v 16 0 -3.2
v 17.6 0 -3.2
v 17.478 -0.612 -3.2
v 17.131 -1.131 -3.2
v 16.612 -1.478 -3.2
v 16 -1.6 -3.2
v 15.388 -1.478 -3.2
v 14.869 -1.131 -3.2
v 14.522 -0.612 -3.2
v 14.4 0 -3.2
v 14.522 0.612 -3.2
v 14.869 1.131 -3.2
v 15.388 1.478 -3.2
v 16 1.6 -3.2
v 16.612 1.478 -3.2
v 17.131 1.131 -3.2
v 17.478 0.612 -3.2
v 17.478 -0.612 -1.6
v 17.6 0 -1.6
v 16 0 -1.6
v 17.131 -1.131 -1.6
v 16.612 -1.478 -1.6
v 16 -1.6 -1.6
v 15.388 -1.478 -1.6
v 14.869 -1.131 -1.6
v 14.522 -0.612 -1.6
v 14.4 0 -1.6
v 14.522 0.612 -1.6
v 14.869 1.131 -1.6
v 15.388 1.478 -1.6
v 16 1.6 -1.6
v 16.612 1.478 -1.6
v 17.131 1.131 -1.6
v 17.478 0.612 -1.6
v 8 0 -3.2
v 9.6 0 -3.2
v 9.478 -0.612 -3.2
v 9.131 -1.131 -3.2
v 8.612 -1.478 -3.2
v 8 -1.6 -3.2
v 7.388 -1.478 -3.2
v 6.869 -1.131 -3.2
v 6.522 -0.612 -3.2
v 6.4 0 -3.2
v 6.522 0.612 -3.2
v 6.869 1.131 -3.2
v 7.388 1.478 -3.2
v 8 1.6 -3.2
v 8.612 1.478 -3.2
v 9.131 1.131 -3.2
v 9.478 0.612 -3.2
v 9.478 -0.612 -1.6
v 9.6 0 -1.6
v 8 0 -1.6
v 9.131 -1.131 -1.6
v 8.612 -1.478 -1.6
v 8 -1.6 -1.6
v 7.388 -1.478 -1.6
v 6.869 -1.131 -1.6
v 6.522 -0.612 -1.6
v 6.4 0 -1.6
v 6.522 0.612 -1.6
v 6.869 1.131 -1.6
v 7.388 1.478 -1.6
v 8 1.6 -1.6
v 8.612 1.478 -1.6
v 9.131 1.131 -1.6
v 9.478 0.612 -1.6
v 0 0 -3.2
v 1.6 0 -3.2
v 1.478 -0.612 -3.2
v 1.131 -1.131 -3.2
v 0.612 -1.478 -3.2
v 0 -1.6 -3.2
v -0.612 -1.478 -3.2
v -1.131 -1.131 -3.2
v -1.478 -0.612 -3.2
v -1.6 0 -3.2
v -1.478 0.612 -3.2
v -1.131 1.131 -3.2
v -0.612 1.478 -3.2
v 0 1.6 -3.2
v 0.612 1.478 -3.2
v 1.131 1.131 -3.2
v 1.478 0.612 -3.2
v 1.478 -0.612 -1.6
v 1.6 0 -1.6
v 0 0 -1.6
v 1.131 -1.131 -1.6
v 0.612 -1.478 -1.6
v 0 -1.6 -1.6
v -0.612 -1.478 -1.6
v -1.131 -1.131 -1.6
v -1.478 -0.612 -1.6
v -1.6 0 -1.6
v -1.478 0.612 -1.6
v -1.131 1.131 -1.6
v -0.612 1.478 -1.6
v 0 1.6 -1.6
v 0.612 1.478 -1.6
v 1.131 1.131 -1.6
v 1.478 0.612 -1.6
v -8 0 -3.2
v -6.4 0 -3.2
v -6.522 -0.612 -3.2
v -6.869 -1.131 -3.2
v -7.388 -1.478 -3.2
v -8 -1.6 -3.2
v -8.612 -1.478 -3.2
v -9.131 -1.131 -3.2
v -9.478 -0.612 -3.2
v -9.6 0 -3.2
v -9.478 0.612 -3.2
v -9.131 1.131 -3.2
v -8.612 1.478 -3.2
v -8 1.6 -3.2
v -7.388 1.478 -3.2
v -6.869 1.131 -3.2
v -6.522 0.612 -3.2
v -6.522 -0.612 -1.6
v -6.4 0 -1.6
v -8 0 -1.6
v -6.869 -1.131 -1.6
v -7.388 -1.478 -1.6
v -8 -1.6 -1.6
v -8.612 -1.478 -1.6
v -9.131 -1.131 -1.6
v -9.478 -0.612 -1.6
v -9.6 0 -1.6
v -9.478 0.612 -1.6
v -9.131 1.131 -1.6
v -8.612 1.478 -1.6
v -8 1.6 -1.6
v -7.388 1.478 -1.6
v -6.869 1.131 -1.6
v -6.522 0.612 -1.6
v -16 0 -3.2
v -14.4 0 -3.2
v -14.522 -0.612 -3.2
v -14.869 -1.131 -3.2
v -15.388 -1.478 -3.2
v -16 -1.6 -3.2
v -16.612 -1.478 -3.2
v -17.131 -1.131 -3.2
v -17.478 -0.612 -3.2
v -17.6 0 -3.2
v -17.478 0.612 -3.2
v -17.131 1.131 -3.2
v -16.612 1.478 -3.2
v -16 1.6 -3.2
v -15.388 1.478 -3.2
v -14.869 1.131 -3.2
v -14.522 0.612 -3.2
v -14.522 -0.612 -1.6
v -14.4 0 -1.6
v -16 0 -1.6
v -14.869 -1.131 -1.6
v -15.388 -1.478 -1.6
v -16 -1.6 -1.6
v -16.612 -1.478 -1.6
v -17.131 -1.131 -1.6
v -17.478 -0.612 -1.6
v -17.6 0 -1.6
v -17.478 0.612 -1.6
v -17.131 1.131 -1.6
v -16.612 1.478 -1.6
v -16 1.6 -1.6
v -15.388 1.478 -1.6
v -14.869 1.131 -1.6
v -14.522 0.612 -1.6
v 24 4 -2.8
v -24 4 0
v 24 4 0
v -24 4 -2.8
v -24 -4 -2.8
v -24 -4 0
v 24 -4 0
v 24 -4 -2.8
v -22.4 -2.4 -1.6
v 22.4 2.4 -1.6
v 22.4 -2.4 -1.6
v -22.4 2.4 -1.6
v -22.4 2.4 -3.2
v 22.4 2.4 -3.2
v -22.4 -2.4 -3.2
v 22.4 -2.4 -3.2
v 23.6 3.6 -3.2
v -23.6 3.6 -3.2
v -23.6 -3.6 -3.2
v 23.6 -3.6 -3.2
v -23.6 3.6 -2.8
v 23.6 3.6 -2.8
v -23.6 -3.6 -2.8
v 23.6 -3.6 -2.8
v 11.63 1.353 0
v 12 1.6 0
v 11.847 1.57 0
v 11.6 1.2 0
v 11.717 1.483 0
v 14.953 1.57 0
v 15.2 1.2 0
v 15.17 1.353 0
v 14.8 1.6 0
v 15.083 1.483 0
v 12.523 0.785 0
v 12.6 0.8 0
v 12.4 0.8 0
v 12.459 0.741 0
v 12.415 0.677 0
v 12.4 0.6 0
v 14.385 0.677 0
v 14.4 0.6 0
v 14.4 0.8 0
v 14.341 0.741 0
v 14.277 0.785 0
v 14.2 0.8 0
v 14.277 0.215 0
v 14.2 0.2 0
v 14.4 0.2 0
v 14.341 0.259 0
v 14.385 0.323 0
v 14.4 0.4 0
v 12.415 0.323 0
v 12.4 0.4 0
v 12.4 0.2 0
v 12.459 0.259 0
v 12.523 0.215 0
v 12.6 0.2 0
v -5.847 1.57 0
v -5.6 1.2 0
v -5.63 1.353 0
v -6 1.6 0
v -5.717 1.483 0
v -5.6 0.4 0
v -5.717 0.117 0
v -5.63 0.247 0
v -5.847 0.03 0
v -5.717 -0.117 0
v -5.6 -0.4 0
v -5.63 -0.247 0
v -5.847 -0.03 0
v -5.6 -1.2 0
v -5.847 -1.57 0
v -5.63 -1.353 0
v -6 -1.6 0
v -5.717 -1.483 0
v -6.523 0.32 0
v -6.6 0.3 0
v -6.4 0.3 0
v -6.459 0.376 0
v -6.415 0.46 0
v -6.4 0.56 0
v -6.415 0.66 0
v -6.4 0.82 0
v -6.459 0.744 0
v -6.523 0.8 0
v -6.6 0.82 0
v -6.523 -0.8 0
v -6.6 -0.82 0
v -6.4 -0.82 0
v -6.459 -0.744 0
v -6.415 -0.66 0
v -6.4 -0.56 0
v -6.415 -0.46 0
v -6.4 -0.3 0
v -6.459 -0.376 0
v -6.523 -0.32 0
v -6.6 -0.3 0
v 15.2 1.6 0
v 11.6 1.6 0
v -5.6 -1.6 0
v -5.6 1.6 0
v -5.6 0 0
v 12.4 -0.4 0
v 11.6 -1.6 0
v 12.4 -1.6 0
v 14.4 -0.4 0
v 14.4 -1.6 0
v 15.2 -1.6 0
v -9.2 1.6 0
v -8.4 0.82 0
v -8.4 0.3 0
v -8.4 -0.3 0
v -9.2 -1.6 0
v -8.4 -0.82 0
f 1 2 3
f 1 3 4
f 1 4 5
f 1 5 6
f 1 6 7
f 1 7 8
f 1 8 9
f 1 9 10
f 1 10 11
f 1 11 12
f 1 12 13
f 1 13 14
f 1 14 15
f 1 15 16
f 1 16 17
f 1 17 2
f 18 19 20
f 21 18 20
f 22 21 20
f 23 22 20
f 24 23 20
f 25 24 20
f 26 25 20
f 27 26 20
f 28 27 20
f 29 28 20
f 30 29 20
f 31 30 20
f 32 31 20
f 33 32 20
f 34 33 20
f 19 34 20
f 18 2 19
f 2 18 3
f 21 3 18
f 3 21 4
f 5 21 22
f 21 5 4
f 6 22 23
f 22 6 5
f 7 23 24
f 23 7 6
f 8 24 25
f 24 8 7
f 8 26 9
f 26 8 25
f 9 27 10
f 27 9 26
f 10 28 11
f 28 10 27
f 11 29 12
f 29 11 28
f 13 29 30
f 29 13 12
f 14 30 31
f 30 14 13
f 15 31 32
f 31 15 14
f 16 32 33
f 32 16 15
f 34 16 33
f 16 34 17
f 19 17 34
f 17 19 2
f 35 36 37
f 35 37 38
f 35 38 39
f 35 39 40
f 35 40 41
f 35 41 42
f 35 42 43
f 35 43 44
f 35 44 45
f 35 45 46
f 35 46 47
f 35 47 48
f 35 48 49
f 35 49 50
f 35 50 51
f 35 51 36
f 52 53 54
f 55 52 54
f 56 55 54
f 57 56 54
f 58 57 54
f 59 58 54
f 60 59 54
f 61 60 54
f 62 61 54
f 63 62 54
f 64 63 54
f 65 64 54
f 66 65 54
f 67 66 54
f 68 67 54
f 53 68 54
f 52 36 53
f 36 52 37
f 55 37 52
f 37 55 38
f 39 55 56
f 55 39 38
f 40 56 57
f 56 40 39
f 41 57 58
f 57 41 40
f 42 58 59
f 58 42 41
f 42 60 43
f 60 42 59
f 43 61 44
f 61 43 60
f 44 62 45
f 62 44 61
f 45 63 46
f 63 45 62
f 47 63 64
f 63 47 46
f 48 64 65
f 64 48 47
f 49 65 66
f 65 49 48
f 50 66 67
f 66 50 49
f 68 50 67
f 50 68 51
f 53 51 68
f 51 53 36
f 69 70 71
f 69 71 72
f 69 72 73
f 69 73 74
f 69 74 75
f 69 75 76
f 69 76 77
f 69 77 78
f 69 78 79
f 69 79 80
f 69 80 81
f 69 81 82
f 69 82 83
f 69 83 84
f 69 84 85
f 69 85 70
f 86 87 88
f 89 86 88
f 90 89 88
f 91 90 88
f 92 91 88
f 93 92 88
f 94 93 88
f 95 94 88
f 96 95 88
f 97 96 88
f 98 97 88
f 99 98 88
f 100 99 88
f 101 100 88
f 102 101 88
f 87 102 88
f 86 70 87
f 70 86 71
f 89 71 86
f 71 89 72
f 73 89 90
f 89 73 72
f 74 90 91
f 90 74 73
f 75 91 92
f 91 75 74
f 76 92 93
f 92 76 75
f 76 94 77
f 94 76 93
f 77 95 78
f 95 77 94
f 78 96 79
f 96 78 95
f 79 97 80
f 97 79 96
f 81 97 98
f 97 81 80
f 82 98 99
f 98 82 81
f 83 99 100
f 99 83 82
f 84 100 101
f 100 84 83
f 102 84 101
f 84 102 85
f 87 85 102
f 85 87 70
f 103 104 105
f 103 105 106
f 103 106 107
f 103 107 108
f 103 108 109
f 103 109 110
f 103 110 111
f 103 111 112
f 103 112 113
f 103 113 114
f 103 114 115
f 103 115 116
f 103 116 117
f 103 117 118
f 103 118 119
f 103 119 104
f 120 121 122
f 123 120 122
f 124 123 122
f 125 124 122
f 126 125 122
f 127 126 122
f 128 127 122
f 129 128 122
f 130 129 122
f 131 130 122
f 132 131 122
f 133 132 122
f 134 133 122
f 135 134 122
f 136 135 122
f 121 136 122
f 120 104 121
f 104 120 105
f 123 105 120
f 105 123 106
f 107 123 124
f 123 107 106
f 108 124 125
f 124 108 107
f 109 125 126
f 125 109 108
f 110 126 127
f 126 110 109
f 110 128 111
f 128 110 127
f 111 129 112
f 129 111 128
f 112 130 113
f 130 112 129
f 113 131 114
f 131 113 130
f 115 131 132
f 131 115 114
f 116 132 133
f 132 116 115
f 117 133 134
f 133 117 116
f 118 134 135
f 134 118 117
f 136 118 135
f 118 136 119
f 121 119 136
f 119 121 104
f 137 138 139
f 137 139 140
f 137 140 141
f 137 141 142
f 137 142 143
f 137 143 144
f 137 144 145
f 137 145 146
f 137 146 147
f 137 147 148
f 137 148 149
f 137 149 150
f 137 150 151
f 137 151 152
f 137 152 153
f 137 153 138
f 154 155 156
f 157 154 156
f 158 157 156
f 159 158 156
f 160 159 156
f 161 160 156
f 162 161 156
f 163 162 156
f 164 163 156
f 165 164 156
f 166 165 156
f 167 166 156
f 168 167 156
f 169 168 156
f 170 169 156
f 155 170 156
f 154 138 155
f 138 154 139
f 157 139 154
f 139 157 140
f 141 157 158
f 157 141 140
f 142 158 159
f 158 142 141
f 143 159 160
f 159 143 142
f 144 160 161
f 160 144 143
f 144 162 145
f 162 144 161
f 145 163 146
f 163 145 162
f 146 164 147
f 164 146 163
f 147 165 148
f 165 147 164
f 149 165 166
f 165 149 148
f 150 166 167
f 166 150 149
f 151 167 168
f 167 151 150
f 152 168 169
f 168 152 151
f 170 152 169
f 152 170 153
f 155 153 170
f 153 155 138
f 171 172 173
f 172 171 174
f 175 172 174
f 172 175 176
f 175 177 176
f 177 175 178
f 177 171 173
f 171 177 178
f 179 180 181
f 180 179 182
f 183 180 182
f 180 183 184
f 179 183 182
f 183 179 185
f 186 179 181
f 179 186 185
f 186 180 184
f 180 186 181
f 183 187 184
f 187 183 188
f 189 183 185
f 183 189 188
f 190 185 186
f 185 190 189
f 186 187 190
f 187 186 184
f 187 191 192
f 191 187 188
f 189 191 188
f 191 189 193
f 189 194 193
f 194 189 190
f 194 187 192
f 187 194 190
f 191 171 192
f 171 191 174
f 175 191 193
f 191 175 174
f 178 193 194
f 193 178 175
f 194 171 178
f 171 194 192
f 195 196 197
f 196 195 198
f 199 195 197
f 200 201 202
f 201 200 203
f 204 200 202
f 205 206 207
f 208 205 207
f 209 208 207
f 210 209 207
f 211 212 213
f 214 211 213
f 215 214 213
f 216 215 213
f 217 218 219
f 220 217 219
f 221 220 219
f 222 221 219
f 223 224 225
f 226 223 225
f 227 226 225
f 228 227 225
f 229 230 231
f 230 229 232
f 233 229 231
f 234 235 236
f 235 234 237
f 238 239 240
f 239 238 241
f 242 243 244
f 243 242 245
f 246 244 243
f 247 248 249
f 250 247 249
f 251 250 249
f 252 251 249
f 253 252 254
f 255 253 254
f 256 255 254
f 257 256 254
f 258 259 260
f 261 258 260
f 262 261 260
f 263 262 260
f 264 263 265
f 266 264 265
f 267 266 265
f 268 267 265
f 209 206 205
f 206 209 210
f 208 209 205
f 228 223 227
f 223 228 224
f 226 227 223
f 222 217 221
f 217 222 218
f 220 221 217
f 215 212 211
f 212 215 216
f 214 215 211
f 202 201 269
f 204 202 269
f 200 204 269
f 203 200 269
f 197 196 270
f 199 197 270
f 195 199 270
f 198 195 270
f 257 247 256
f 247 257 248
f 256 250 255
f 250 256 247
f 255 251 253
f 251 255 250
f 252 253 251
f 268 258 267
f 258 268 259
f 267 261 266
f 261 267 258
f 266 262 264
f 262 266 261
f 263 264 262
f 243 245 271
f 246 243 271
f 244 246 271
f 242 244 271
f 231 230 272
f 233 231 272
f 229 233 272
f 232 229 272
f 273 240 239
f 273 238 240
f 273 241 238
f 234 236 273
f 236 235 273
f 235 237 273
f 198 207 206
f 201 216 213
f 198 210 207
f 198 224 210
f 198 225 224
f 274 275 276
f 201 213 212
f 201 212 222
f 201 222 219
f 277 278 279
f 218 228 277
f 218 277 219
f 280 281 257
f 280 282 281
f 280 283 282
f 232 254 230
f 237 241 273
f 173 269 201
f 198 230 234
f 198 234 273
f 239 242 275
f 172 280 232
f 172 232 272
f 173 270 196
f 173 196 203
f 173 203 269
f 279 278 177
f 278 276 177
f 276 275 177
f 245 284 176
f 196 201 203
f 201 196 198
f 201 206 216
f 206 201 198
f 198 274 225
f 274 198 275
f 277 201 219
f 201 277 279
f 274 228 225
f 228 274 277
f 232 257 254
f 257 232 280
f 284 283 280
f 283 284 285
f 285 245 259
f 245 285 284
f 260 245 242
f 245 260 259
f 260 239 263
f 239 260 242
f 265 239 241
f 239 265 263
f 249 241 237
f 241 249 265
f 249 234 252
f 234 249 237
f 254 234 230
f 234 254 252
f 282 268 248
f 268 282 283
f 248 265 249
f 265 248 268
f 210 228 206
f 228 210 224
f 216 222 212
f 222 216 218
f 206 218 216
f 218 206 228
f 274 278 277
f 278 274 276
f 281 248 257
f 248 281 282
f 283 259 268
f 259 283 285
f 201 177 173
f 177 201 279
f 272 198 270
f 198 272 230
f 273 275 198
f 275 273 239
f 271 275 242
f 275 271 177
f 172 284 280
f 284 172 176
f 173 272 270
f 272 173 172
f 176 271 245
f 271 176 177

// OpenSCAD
// file: ../p/4-4edge.scad
use <../lib.scad>
function ldraw_lib__4_4edge() = [
// 0 Circle 1.0
// 0 Name: 4-4edge.dat
// 0 Author: James Jessiman
// 0 !LDRAW_ORG Primitive UPDATE 2017-01
// 0 !LICENSE Licensed under CC BY 2.0 and CC BY 4.0 : see CAreadme.txt
// 
// 0 BFC CERTIFY CCW
  [0,"BFC","CERTIFY"],
  [0,"BFC","CCW"],
// 
// 0 !HISTORY 1998-12-15 [PTadmin] Official Update 1998-10
// 0 !HISTORY 2005-12-28 [PTadmin] Official Update 2005-01
// 0 !HISTORY 2007-06-24 [PTadmin] Header formatted for Contributor Agreement
// 0 !HISTORY 2008-07-01 [PTadmin] Official Update 2008-01
// 0 !HISTORY 2017-01-15 [Steffen] BFCed
// 0 !HISTORY 2017-12-30 [PTadmin] Official Update 2017-01
// 
// 
// 2 24 1 0 0 0.9239 0 0.3827
  [2,24,1,0,0,0.9239,0,0.3827],
// 2 24 0.9239 0 0.3827 0.7071 0 0.7071
  [2,24,0.9239,0,0.3827,0.7071,0,0.7071],
// 2 24 0.7071 0 0.7071 0.3827 0 0.9239
  [2,24,0.7071,0,0.7071,0.3827,0,0.9239],
// 2 24 0.3827 0 0.9239 0 0 1
  [2,24,0.3827,0,0.9239,0,0,1],
// 2 24 0 0 1 -0.3827 0 0.9239
  [2,24,0,0,1,-0.3827,0,0.9239],
// 2 24 -0.3827 0 0.9239 -0.7071 0 0.7071
  [2,24,-0.3827,0,0.9239,-0.7071,0,0.7071],
// 2 24 -0.7071 0 0.7071 -0.9239 0 0.3827
  [2,24,-0.7071,0,0.7071,-0.9239,0,0.3827],
// 2 24 -0.9239 0 0.3827 -1 0 -0
  [2,24,-0.9239,0,0.3827,-1,0,-0],
// 2 24 -1 0 -0 -0.9239 0 -0.3827
  [2,24,-1,0,-0,-0.9239,0,-0.3827],
// 2 24 -0.9239 0 -0.3827 -0.7071 0 -0.7071
  [2,24,-0.9239,0,-0.3827,-0.7071,0,-0.7071],
// 2 24 -0.7071 0 -0.7071 -0.3827 0 -0.9239
  [2,24,-0.7071,0,-0.7071,-0.3827,0,-0.9239],
// 2 24 -0.3827 0 -0.9239 0 0 -1
  [2,24,-0.3827,0,-0.9239,0,0,-1],
// 2 24 0 0 -1 0.3827 0 -0.9239
  [2,24,0,0,-1,0.3827,0,-0.9239],
// 2 24 0.3827 0 -0.9239 0.7071 0 -0.7071
  [2,24,0.3827,0,-0.9239,0.7071,0,-0.7071],
// 2 24 0.7071 0 -0.7071 0.9239 0 -0.3827
  [2,24,0.7071,0,-0.7071,0.9239,0,-0.3827],
// 2 24 0.9239 0 -0.3827 1 0 0
  [2,24,0.9239,0,-0.3827,1,0,0],
];
module ldraw_lib__4_4edge(step=0, col=false, unit=2/5, alt=false, line=0.2, solid=!$preview)
    makepoly(ldraw_lib__4_4edge(), step=step, col=col, unit=unit, alt=alt, line=line, solid=solid);
ldraw_lib__4_4edge(line=0.2);
// file: ../p/4-4disc.scad
use <../lib.scad>
function ldraw_lib__4_4disc() = [
// 0 Disc 1.0
// 0 Name: 4-4disc.dat
// 0 Author: James Jessiman
// 0 !LDRAW_ORG Primitive UPDATE 2002-02
// 0 !LICENSE Licensed under CC BY 2.0 and CC BY 4.0 : see CAreadme.txt
// 
// 0 BFC CERTIFY CCW
  [0,"BFC","CERTIFY"],
  [0,"BFC","CCW"],
// 
// 0 !HISTORY 1998-12-15 [PTadmin] Official Update 1998-10
// 0 !HISTORY 2002-03-23 [sbliss] Added BFC statement
// 0 !HISTORY 2002-04-25 [PTadmin] Official Update 2002-02
// 0 !HISTORY 2007-06-24 [PTadmin] Header formatted for Contributor Agreement
// 0 !HISTORY 2008-07-01 [PTadmin] Official Update 2008-01
// 
// 
// 3 16 0 0 0 1 0 0 0.9239 0 0.3827
  [3,16,0,0,0,1,0,0,0.9239,0,0.3827],
// 3 16 0 0 0 0.9239 0 0.3827 0.7071 0 0.7071
  [3,16,0,0,0,0.9239,0,0.3827,0.7071,0,0.7071],
// 3 16 0 0 0 0.7071 0 0.7071 0.3827 0 0.9239
  [3,16,0,0,0,0.7071,0,0.7071,0.3827,0,0.9239],
// 3 16 0 0 0 0.3827 0 0.9239 0 0 1
  [3,16,0,0,0,0.3827,0,0.9239,0,0,1],
// 3 16 0 0 0 0 0 1 -0.3827 0 0.9239
  [3,16,0,0,0,0,0,1,-0.3827,0,0.9239],
// 3 16 0 0 0 -0.3827 0 0.9239 -0.7071 0 0.7071
  [3,16,0,0,0,-0.3827,0,0.9239,-0.7071,0,0.7071],
// 3 16 0 0 0 -0.7071 0 0.7071 -0.9239 0 0.3827
  [3,16,0,0,0,-0.7071,0,0.7071,-0.9239,0,0.3827],
// 3 16 0 0 0 -0.9239 0 0.3827 -1 0 -0
  [3,16,0,0,0,-0.9239,0,0.3827,-1,0,-0],
// 3 16 0 0 0 -1 0 -0 -0.9239 0 -0.3827
  [3,16,0,0,0,-1,0,-0,-0.9239,0,-0.3827],
// 3 16 0 0 0 -0.9239 0 -0.3827 -0.7071 0 -0.7071
  [3,16,0,0,0,-0.9239,0,-0.3827,-0.7071,0,-0.7071],
// 3 16 0 0 0 -0.7071 0 -0.7071 -0.3827 0 -0.9239
  [3,16,0,0,0,-0.7071,0,-0.7071,-0.3827,0,-0.9239],
// 3 16 0 0 0 -0.3827 0 -0.9239 0 0 -1
  [3,16,0,0,0,-0.3827,0,-0.9239,0,0,-1],
// 3 16 0 0 0 0 0 -1 0.3827 0 -0.9239
  [3,16,0,0,0,0,0,-1,0.3827,0,-0.9239],
// 3 16 0 0 0 0.3827 0 -0.9239 0.7071 0 -0.7071
  [3,16,0,0,0,0.3827,0,-0.9239,0.7071,0,-0.7071],
// 3 16 0 0 0 0.7071 0 -0.7071 0.9239 0 -0.3827
  [3,16,0,0,0,0.7071,0,-0.7071,0.9239,0,-0.3827],
// 3 16 0 0 0 0.9239 0 -0.3827 1 0 0
  [3,16,0,0,0,0.9239,0,-0.3827,1,0,0],
// 0
];
module ldraw_lib__4_4disc(step=0, col=false, unit=2/5, alt=false, line=0.2, solid=!$preview)
    makepoly(ldraw_lib__4_4disc(), step=step, col=col, unit=unit, alt=alt, line=line, solid=solid);
ldraw_lib__4_4disc(line=0.2);
// file: ../p/4-4cyli.scad
use <../lib.scad>
$fa=1; $fs=0.2;
function ldraw_lib__4_4cyli(realsolid=false) = [
// 0 Cylinder 1.0
// 0 Name: 4-4cyli.dat
// 0 Author: James Jessiman
// 0 !LDRAW_ORG Primitive UPDATE 2005-01
// 0 !LICENSE Licensed under CC BY 2.0 and CC BY 4.0 : see CAreadme.txt
// 
// 0 BFC CERTIFY CCW
  [0,"BFC","CERTIFY"],
  [0,"BFC","CCW"],
// 
// 0 !HISTORY 1998-12-15 [PTadmin] Official Update 1998-10
// 0 !HISTORY 2002-03-23 [sbliss] Added BFC statement; merged headers from files in distributions LDraw 0.27 and Complete.
// 0 !HISTORY 2002-04-25 [PTadmin] Official Update 2002-02
// 0 !HISTORY 2004-12-14 [guyvivan] BFC CCW
// 0 !HISTORY 2005-12-28 [PTadmin] Official Update 2005-01
// 0 !HISTORY 2007-06-24 [PTadmin] Header formatted for Contributor Agreement
// 0 !HISTORY 2008-07-01 [PTadmin] Official Update 2008-01
// 
// 
// 4 16 1 1 0 0.9239 1 0.3827 0.9239 0 0.3827 1 0 0
  [4,16,1,1,0,0.9239,1,0.3827,0.9239,0,0.3827,1,0,0],
// 5 24 1 0 0 1 1 0 0.9239 0 0.3827 0.9239 0 -0.3827
  [5,24,1,0,0,1,1,0,0.9239,0,0.3827,0.9239,0,-0.3827],
// 4 16 0.9239 1 0.3827 0.7071 1 0.7071 0.7071 0 0.7071 0.9239 0 0.3827
  [4,16,0.9239,1,0.3827,0.7071,1,0.7071,0.7071,0,0.7071,0.9239,0,0.3827],
// 5 24 0.9239 0 0.3827 0.9239 1 0.3827 0.7071 0 0.7071 1 0 0
  [5,24,0.9239,0,0.3827,0.9239,1,0.3827,0.7071,0,0.7071,1,0,0],
// 4 16 0.7071 1 0.7071 0.3827 1 0.9239 0.3827 0 0.9239 0.7071 0 0.7071
  [4,16,0.7071,1,0.7071,0.3827,1,0.9239,0.3827,0,0.9239,0.7071,0,0.7071],
// 5 24 0.7071 0 0.7071 0.7071 1 0.7071 0.3827 0 0.9239 0.9239 0 0.3827
  [5,24,0.7071,0,0.7071,0.7071,1,0.7071,0.3827,0,0.9239,0.9239,0,0.3827],
// 4 16 0.3827 1 0.9239 0 1 1 0 0 1 0.3827 0 0.9239
  [4,16,0.3827,1,0.9239,0,1,1,0,0,1,0.3827,0,0.9239],
// 5 24 0.3827 0 0.9239 0.3827 1 0.9239 0 0 1 0.7071 0 0.7071
  [5,24,0.3827,0,0.9239,0.3827,1,0.9239,0,0,1,0.7071,0,0.7071],
// 4 16 0 1 1 -0.3827 1 0.9239 -0.3827 0 0.9239 0 0 1
  [4,16,0,1,1,-0.3827,1,0.9239,-0.3827,0,0.9239,0,0,1],
// 5 24 0 0 1 0 1 1 -0.3827 0 0.9239 0.3827 0 0.9239
  [5,24,0,0,1,0,1,1,-0.3827,0,0.9239,0.3827,0,0.9239],
// 4 16 -0.3827 1 0.9239 -0.7071 1 0.7071 -0.7071 0 0.7071 -0.3827 0 0.9239
  [4,16,-0.3827,1,0.9239,-0.7071,1,0.7071,-0.7071,0,0.7071,-0.3827,0,0.9239],
// 5 24 -0.3827 0 0.9239 -0.3827 1 0.9239 -0.7071 0 0.7071 0 0 1
  [5,24,-0.3827,0,0.9239,-0.3827,1,0.9239,-0.7071,0,0.7071,0,0,1],
// 4 16 -0.7071 1 0.7071 -0.9239 1 0.3827 -0.9239 0 0.3827 -0.7071 0 0.7071
  [4,16,-0.7071,1,0.7071,-0.9239,1,0.3827,-0.9239,0,0.3827,-0.7071,0,0.7071],
// 5 24 -0.7071 0 0.7071 -0.7071 1 0.7071 -0.9239 0 0.3827 -0.3827 0 0.9239
  [5,24,-0.7071,0,0.7071,-0.7071,1,0.7071,-0.9239,0,0.3827,-0.3827,0,0.9239],
// 4 16 -0.9239 1 0.3827 -1 1 0 -1 0 0 -0.9239 0 0.3827
  [4,16,-0.9239,1,0.3827,-1,1,0,-1,0,0,-0.9239,0,0.3827],
// 5 24 -0.9239 0 0.3827 -0.9239 1 0.3827 -1 0 0 -0.7071 0 0.7071
  [5,24,-0.9239,0,0.3827,-0.9239,1,0.3827,-1,0,0,-0.7071,0,0.7071],
// 4 16 -1 1 0 -0.9239 1 -0.3827 -0.9239 0 -0.3827 -1 0 0
  [4,16,-1,1,0,-0.9239,1,-0.3827,-0.9239,0,-0.3827,-1,0,0],
// 5 24 -1 0 0 -1 1 0 -0.9239 0 -0.3827 -0.9239 0 0.3827
  [5,24,-1,0,0,-1,1,0,-0.9239,0,-0.3827,-0.9239,0,0.3827],
// 4 16 -0.9239 1 -0.3827 -0.7071 1 -0.7071 -0.7071 0 -0.7071 -0.9239 0 -0.3827
  [4,16,-0.9239,1,-0.3827,-0.7071,1,-0.7071,-0.7071,0,-0.7071,-0.9239,0,-0.3827],
// 5 24 -0.9239 0 -0.3827 -0.9239 1 -0.3827 -0.7071 0 -0.7071 -1 0 0
  [5,24,-0.9239,0,-0.3827,-0.9239,1,-0.3827,-0.7071,0,-0.7071,-1,0,0],
// 4 16 -0.7071 1 -0.7071 -0.3827 1 -0.9239 -0.3827 0 -0.9239 -0.7071 0 -0.7071
  [4,16,-0.7071,1,-0.7071,-0.3827,1,-0.9239,-0.3827,0,-0.9239,-0.7071,0,-0.7071],
// 5 24 -0.7071 0 -0.7071 -0.7071 1 -0.7071 -0.3827 0 -0.9239 -0.9239 0 -0.3827
  [5,24,-0.7071,0,-0.7071,-0.7071,1,-0.7071,-0.3827,0,-0.9239,-0.9239,0,-0.3827],
// 4 16 -0.3827 1 -0.9239 0 1 -1 0 0 -1 -0.3827 0 -0.9239
  [4,16,-0.3827,1,-0.9239,0,1,-1,0,0,-1,-0.3827,0,-0.9239],
// 5 24 -0.3827 0 -0.9239 -0.3827 1 -0.9239 0 0 -1 -0.7071 0 -0.7071
  [5,24,-0.3827,0,-0.9239,-0.3827,1,-0.9239,0,0,-1,-0.7071,0,-0.7071],
// 4 16 0 1 -1 0.3827 1 -0.9239 0.3827 0 -0.9239 0 0 -1
  [4,16,0,1,-1,0.3827,1,-0.9239,0.3827,0,-0.9239,0,0,-1],
// 5 24 0 0 -1 0 1 -1 0.3827 0 -0.9239 -0.3827 0 -0.9239
  [5,24,0,0,-1,0,1,-1,0.3827,0,-0.9239,-0.3827,0,-0.9239],
// 4 16 0.3827 1 -0.9239 0.7071 1 -0.7071 0.7071 0 -0.7071 0.3827 0 -0.9239
  [4,16,0.3827,1,-0.9239,0.7071,1,-0.7071,0.7071,0,-0.7071,0.3827,0,-0.9239],
// 5 24 0.3827 0 -0.9239 0.3827 1 -0.9239 0.7071 0 -0.7071 0 0 -1
  [5,24,0.3827,0,-0.9239,0.3827,1,-0.9239,0.7071,0,-0.7071,0,0,-1],
// 4 16 0.7071 1 -0.7071 0.9239 1 -0.3827 0.9239 0 -0.3827 0.7071 0 -0.7071
  [4,16,0.7071,1,-0.7071,0.9239,1,-0.3827,0.9239,0,-0.3827,0.7071,0,-0.7071],
// 5 24 0.7071 0 -0.7071 0.7071 1 -0.7071 0.9239 0 -0.3827 0.3827 0 -0.9239
  [5,24,0.7071,0,-0.7071,0.7071,1,-0.7071,0.9239,0,-0.3827,0.3827,0,-0.9239],
// 4 16 0.9239 1 -0.3827 1 1 0 1 0 0 0.9239 0 -0.3827
  [4,16,0.9239,1,-0.3827,1,1,0,1,0,0,0.9239,0,-0.3827],
// 5 24 0.9239 0 -0.3827 0.9239 1 -0.3827 1 0 0 0.7071 0 -0.7071
  [5,24,0.9239,0,-0.3827,0.9239,1,-0.3827,1,0,0,0.7071,0,-0.7071],
// 0
];
module ldraw_lib__4_4cyli(step=0, col=false, unit=2/5, alt=false, line=0.2, solid=!$preview)
    makepoly(ldraw_lib__4_4cyli(solid), step=step, col=col, unit=unit, alt=alt, line=line, solid=solid);
ldraw_lib__4_4cyli(line=0.2);
// file: ../p/stud3.scad
use <../lib.scad>
use <4-4cyli.scad>
use <4-4disc.scad>
use <4-4edge.scad>
function ldraw_lib__stud3() = [
// 0 Stud Tube Solid
// 0 Name: stud3.dat
// 0 Author: James Jessiman
// 0 !LDRAW_ORG Primitive UPDATE 2012-01
// 0 !LICENSE Licensed under CC BY 4.0 : see CAreadme.txt
// 
// 0 BFC CERTIFY CCW
  [0,"BFC","CERTIFY"],
  [0,"BFC","CCW"],
// 
// 0 !HISTORY 2002-04-04 [sbliss] Modified for BFC compliance
// 0 !HISTORY 2002-04-25 [PTadmin] Official Update 2002-02
// 0 !HISTORY 2007-06-24 [PTadmin] Header formatted for Contributor Agreement
// 0 !HISTORY 2008-07-01 [PTadmin] Official Update 2008-01
// 0 !HISTORY 2012-02-16 [Philo] Changed to CCW
// 0 !HISTORY 2012-03-30 [PTadmin] Official Update 2012-01
// 
// 
// 1 16 0 -4 0 4 0 0 0 1 0 0 0 4 4-4edge.dat
  [1,16,0,-4,0,4,0,0,0,1,0,0,0,4, ldraw_lib__4_4edge()],
// 1 16 0 0 0 4 0 0 0 1 0 0 0 4 4-4edge.dat
  [1,16,0,0,0,4,0,0,0,1,0,0,0,4, ldraw_lib__4_4edge()],
// 1 16 0 -4 0 4 0 0 0 1 0 0 0 4 4-4disc.dat
  [1,16,0,-4,0,4,0,0,0,1,0,0,0,4, ldraw_lib__4_4disc()],
  [-1,16,0,0,0,4,0,0,0,-1,0,0,0,4, ldraw_lib__4_4disc()],
// 1 16 0 -4 0 4 0 0 0 4 0 0 0 4 4-4cyli.dat
  [1,16,0,-4,0,4,0,0,0,4,0,0,0,4, ldraw_lib__4_4cyli()],
];
module ldraw_lib__stud3(step=0, col=false, unit=2/5, alt=false, line=0.2, solid=!$preview)
    makepoly(ldraw_lib__stud3(), step=step, col=col, unit=unit, alt=alt, line=line, solid=solid);
ldraw_lib__stud3(line=0.2);
// file: ../p/box5.scad
use <../lib.scad>
function ldraw_lib__box5() = [
// 0 Box with 5 Faces and All Edges
// 0 Name: box5.dat
// 0 Author: James Jessiman
// 0 !LDRAW_ORG Primitive UPDATE 2012-01
// 0 !LICENSE Licensed under CC BY 2.0 and CC BY 4.0 : see CAreadme.txt
// 
// 0 BFC CERTIFY CCW
  [0,"BFC","CERTIFY"],
  [0,"BFC","CCW"],
// 
// 0 !HISTORY 2002-04-03 [sbliss] Modified for BFC compliance
// 0 !HISTORY 2002-04-25 [PTadmin] Official Update 2002-02
// 0 !HISTORY 2007-06-24 [PTadmin] Header formatted for Contributor Agreement
// 0 !HISTORY 2008-07-01 [PTadmin] Official Update 2008-01
// 0 !HISTORY 2012-02-16 [Philo] Changed to CCW
// 0 !HISTORY 2012-03-30 [PTadmin] Official Update 2012-01
// 
// 
// 2 24 1 1 1 -1 1 1
  [2,24,1,1,1,-1,1,1],
// 2 24 -1 1 1 -1 1 -1
  [2,24,-1,1,1,-1,1,-1],
// 2 24 -1 1 -1 1 1 -1
  [2,24,-1,1,-1,1,1,-1],
// 2 24 1 1 -1 1 1 1
  [2,24,1,1,-1,1,1,1],
// 2 24 1 0 1 -1 0 1
  [2,24,1,0,1,-1,0,1],
// 2 24 -1 0 1 -1 0 -1
  [2,24,-1,0,1,-1,0,-1],
// 2 24 -1 0 -1 1 0 -1
  [2,24,-1,0,-1,1,0,-1],
// 2 24 1 0 -1 1 0 1
  [2,24,1,0,-1,1,0,1],
// 2 24 1 0 1 1 1 1
  [2,24,1,0,1,1,1,1],
// 2 24 -1 0 1 -1 1 1
  [2,24,-1,0,1,-1,1,1],
// 2 24 1 0 -1 1 1 -1
  [2,24,1,0,-1,1,1,-1],
// 2 24 -1 0 -1 -1 1 -1
  [2,24,-1,0,-1,-1,1,-1],
// 4 16 -1 1 1 1 1 1 1 1 -1 -1 1 -1
  [4,16,-1,1,1,1,1,1,1,1,-1,-1,1,-1],
// 4 16 -1 1 1 -1 0 1 1 0 1 1 1 1
  [4,16,-1,1,1,-1,0,1,1,0,1,1,1,1],
// 4 16 -1 1 -1 -1 0 -1 -1 0 1 -1 1 1
  [4,16,-1,1,-1,-1,0,-1,-1,0,1,-1,1,1],
// 4 16 1 1 -1 1 0 -1 -1 0 -1 -1 1 -1
  [4,16,1,1,-1,1,0,-1,-1,0,-1,-1,1,-1],
// 4 16 1 1 1 1 0 1 1 0 -1 1 1 -1
  [4,16,1,1,1,1,0,1,1,0,-1,1,1,-1],
];
makepoly(ldraw_lib__box5(), line=0.2);
// file: ../p/box4.scad
use <../lib.scad>
function ldraw_lib__box4() = [
// 0 Box with 4 Faces (2 Parallel Pairs) and All Edges
// 0 Name: box4.dat
// 0 Author: James Jessiman
// 0 !LDRAW_ORG Primitive UPDATE 2012-01
// 0 !LICENSE Licensed under CC BY 4.0 : see CAreadme.txt
// 
// 0 BFC CERTIFY CCW
  [0,"BFC","CERTIFY"],
  [0,"BFC","CCW"],
// 
// 0 !HISTORY 2002-04-03 [sbliss] Modified for BFC compliance
// 0 !HISTORY 2002-04-25 [PTadmin] Official Update 2002-02
// 0 !HISTORY 2007-06-24 [PTadmin] Header formatted for Contributor Agreement
// 0 !HISTORY 2008-07-01 [PTadmin] Official Update 2008-01
// 0 !HISTORY 2012-02-16 [Philo] Changed to CCW
// 0 !HISTORY 2012-03-30 [PTadmin] Official Update 2012-01
// 
// 
// 2 24 1 1 1 -1 1 1
  [2,24,1,1,1,-1,1,1],
// 2 24 -1 1 1 -1 1 -1
  [2,24,-1,1,1,-1,1,-1],
// 2 24 -1 1 -1 1 1 -1
  [2,24,-1,1,-1,1,1,-1],
// 2 24 1 1 -1 1 1 1
  [2,24,1,1,-1,1,1,1],
// 2 24 1 0 1 -1 0 1
  [2,24,1,0,1,-1,0,1],
// 2 24 -1 0 1 -1 0 -1
  [2,24,-1,0,1,-1,0,-1],
// 2 24 -1 0 -1 1 0 -1
  [2,24,-1,0,-1,1,0,-1],
// 2 24 1 0 -1 1 0 1
  [2,24,1,0,-1,1,0,1],
// 2 24 1 0 1 1 1 1
  [2,24,1,0,1,1,1,1],
// 2 24 -1 0 1 -1 1 1
  [2,24,-1,0,1,-1,1,1],
// 2 24 1 0 -1 1 1 -1
  [2,24,1,0,-1,1,1,-1],
// 2 24 -1 0 -1 -1 1 -1
  [2,24,-1,0,-1,-1,1,-1],
// 4 16 -1 1 1 -1 0 1 1 0 1 1 1 1
  [4,16,-1,1,1,-1,0,1,1,0,1,1,1,1],
// 4 16 -1 1 -1 -1 0 -1 -1 0 1 -1 1 1
  [4,16,-1,1,-1,-1,0,-1,-1,0,1,-1,1,1],
// 4 16 1 1 -1 1 0 -1 -1 0 -1 -1 1 -1
  [4,16,1,1,-1,1,0,-1,-1,0,-1,-1,1,-1],
// 4 16 1 1 1 1 0 1 1 0 -1 1 1 -1
  [4,16,1,1,1,1,0,1,1,0,-1,1,1,-1],
];
module ldraw_lib__box4(step=0, col=false, unit=2/5, alt=false, line=0.2, solid=!$preview)
    makepoly(ldraw_lib__box4(), step=step, col=col, unit=unit, alt=alt, line=line, solid=solid);
ldraw_lib__box4(line=0.2);
// file: s/6636s01.scad
use <../../lib.scad>
use <../../p/box4.scad>
use <../../p/box5.scad>
use <../../p/stud3.scad>
function ldraw_lib__s__6636s01() = [
// 0 ~Tile  1 x  6 without Top Face
// 0 Name: s\6636s01.dat
// 0 Author: C.L.Rasmussen [johnny-thunder]
// 0 !LDRAW_ORG Subpart UPDATE 2009-03
// 0 !LICENSE Licensed under CC BY 2.0 and CC BY 4.0 : see CAreadme.txt
// 
// 0 BFC CERTIFY CCW
  [0,"BFC","CERTIFY"],
  [0,"BFC","CCW"],
// 
// 0 !HISTORY 2009-12-29 [PTadmin] Official Update 2009-03
// 
// 
// 1 16 40 4 0 1 0 0 0 -1 0 0 0 -1 stud3.dat
  [1,16,40,4,0,1,0,0,0,-1,0,0,0,-1, ldraw_lib__stud3()],
// 1 16 20 4 0 1 0 0 0 -1 0 0 0 -1 stud3.dat
  [1,16,20,4,0,1,0,0,0,-1,0,0,0,-1, ldraw_lib__stud3()],
// 1 16 0 4 0 1 0 0 0 -1 0 0 0 -1 stud3.dat
  [1,16,0,4,0,1,0,0,0,-1,0,0,0,-1, ldraw_lib__stud3()],
// 1 16 -20 4 0 1 0 0 0 -1 0 0 0 -1 stud3.dat
  [1,16,-20,4,0,1,0,0,0,-1,0,0,0,-1, ldraw_lib__stud3()],
// 1 16 -40 4 0 1 0 0 0 -1 0 0 0 -1 stud3.dat
  [1,16,-40,4,0,1,0,0,0,-1,0,0,0,-1, ldraw_lib__stud3()],
// 1 16 0 7 0 60 0 0 0 -7 0 0 0 10 box4.dat
  [1,16,0,7,0,60,0,0,0,-7,0,0,0,10, ldraw_lib__box4()],
// 0 BFC INVERTNEXT
  [0,"BFC","INVERTNEXT"],
// 1 16 0 8 0 56 0 0 0 -4 0 0 0 6 box5.dat
  [1,16,0,8,0,56,0,0,0,-4,0,0,0,6, ldraw_lib__box5()],
// 4 16 59 8 9 56 8 6 -56 8 6 -59 8 9
  [4,16,59,8,9,56,8,6,-56,8,6,-59,8,9],
// 4 16 -59 8 9 -56 8 6 -56 8 -6 -59 8 -9
  [4,16,-59,8,9,-56,8,6,-56,8,-6,-59,8,-9],
// 4 16 -59 8 -9 -56 8 -6 56 8 -6 59 8 -9
  [4,16,-59,8,-9,-56,8,-6,56,8,-6,59,8,-9],
// 4 16 59 8 -9 56 8 -6 56 8 6 59 8 9
  [4,16,59,8,-9,56,8,-6,56,8,6,59,8,9],
// 1 16 0 8 0 59 0 0 0 -1 0 0 0 9 box4.dat
  [1,16,0,8,0,59,0,0,0,-1,0,0,0,9, ldraw_lib__box4()],
// 4 16 60 7 10 59 7 9 -59 7 9 -60 7 10
  [4,16,60,7,10,59,7,9,-59,7,9,-60,7,10],
// 4 16 -60 7 10 -59 7 9 -59 7 -9 -60 7 -10
  [4,16,-60,7,10,-59,7,9,-59,7,-9,-60,7,-10],
// 4 16 -60 7 -10 -59 7 -9 59 7 -9 60 7 -10
  [4,16,-60,7,-10,-59,7,-9,59,7,-9,60,7,-10],
// 4 16 60 7 -10 59 7 -9 59 7 9 60 7 10
  [4,16,60,7,-10,59,7,-9,59,7,9,60,7,10],
// 0
];
makepoly(ldraw_lib__s__6636s01(), line=0.2);
// file: ../p/3-16ndis.scad
use <../lib.scad>
function ldraw_lib__3_16ndis() = [
// 0 Disc Negative 0.1875
// 0 Name: 3-16ndis.dat
// 0 Author: Guy Vivan [guyvivan]
// 0 !LDRAW_ORG Primitive UPDATE 2009-01
// 0 !LICENSE Licensed under CC BY 2.0 and CC BY 4.0 : see CAreadme.txt
// 
// 0 BFC CERTIFY CCW
  [0,"BFC","CERTIFY"],
  [0,"BFC","CCW"],
// 
// 0 !HISTORY 2009-05-02 [PTadmin] Official Update 2009-01
// 
// 
// 3 16 1 0 1 0.9239 0 0.3827 1 0 0
  [3,16,1,0,1,0.9239,0,0.3827,1,0,0],
// 3 16 1 0 1 0.7071 0 0.7071 0.9239 0 0.3827
  [3,16,1,0,1,0.7071,0,0.7071,0.9239,0,0.3827],
// 3 16 1 0 1 0.3827 0 0.9239 0.7071 0 0.7071
  [3,16,1,0,1,0.3827,0,0.9239,0.7071,0,0.7071],
// 
// 0 end of file
// 
];
makepoly(ldraw_lib__3_16ndis(), line=0.2);
// file: ../p/3-16chrd.scad
use <../lib.scad>
$fa=1; $fs=0.2;
function ldraw_lib__3_16chrd(realsolid=false) = [
// 0 Chord 0.1875
// 0 Name: 3-16chrd.dat
// 0 Author: Niels Karsdorp [nielsk]
// 0 !LDRAW_ORG Primitive UPDATE 2009-01
// 0 !LICENSE Licensed under CC BY 2.0 and CC BY 4.0 : see CAreadme.txt
// 
// 0 BFC CERTIFY CCW
  [0,"BFC","CERTIFY"],
  [0,"BFC","CCW"],
// 
// 0 !HISTORY 2009-05-02 [PTadmin] Official Update 2009-01
// 
// 
// 4 16 1 0 0 0.9239 0 0.3827 0.7071 0 0.7071 0.3827 0 0.9239
  [4,16,1,0,0,0.9239,0,0.3827,0.7071,0,0.7071,0.3827,0,0.9239],
// 0
// 
];
module ldraw_lib__3_16chrd(step=0, col=false, unit=2/5, alt=false, line=0.2, solid=!$preview)
    makepoly(ldraw_lib__3_16chrd(solid), step=step, col=col, unit=unit, alt=alt, line=line, solid=solid);
ldraw_lib__3_16chrd(line=0.2);
// file: ../p/2-4ndis.scad
use <../lib.scad>
function ldraw_lib__2_4ndis() = [
// 0 Disc Negative 0.5
// 0 Name: 2-4ndis.dat
// 0 Author: James Jessiman
// 0 !LDRAW_ORG Primitive UPDATE 2012-01
// 0 !LICENSE Licensed under CC BY 4.0 : see CAreadme.txt
// 
// 0 BFC CERTIFY CCW
  [0,"BFC","CERTIFY"],
  [0,"BFC","CCW"],
// 
// 0 !HISTORY 2002-03-23 [sbliss] Added BFC statement; compacted code
// 0 !HISTORY 2002-04-25 [PTadmin] Official Update 2002-02
// 0 !HISTORY 2007-06-24 [PTadmin] Header formatted for Contributor Agreement
// 0 !HISTORY 2008-07-01 [PTadmin] Official Update 2008-01
// 0 !HISTORY 2012-02-16 [Philo] Changed to CCW
// 0 !HISTORY 2012-03-30 [PTadmin] Official Update 2012-01
// 
// 
// 3 16 0.9239 0 0.3827 1 0 0 1 0 1
  [3,16,0.9239,0,0.3827,1,0,0,1,0,1],
// 3 16 0.7071 0 0.7071 0.9239 0 0.3827 1 0 1
  [3,16,0.7071,0,0.7071,0.9239,0,0.3827,1,0,1],
// 3 16 0.3827 0 0.9239 0.7071 0 0.7071 1 0 1
  [3,16,0.3827,0,0.9239,0.7071,0,0.7071,1,0,1],
// 3 16 0 0 1 0.3827 0 0.9239 1 0 1
  [3,16,0,0,1,0.3827,0,0.9239,1,0,1],
// 3 16 -0.3827 0 0.9239 0 0 1 -1 0 1
  [3,16,-0.3827,0,0.9239,0,0,1,-1,0,1],
// 3 16 -0.7071 0 0.7071 -0.3827 0 0.9239 -1 0 1
  [3,16,-0.7071,0,0.7071,-0.3827,0,0.9239,-1,0,1],
// 3 16 -0.9239 0 0.3827 -0.7071 0 0.7071 -1 0 1
  [3,16,-0.9239,0,0.3827,-0.7071,0,0.7071,-1,0,1],
// 3 16 -1 0 0 -0.9239 0 0.3827 -1 0 1
  [3,16,-1,0,0,-0.9239,0,0.3827,-1,0,1],
];
module ldraw_lib__2_4ndis(step=0, col=false, unit=2/5, alt=false, line=0.2, solid=!$preview)
    makepoly(ldraw_lib__2_4ndis(), step=step, col=col, unit=unit, alt=alt, line=line, solid=solid);
ldraw_lib__2_4ndis(line=0.2);
// file: ../p/2-4chrd.scad
use <../lib.scad>
$fa=1; $fs=0.2;
function ldraw_lib__2_4chrd(realsolid=false) = [
// 0 Chord 0.5
// 0 Name: 2-4chrd.dat
// 0 Author: Philippe Hurbain [Philo]
// 0 !LDRAW_ORG Primitive UPDATE 2014-01
// 0 !LICENSE Licensed under CC BY 2.0 and CC BY 4.0 : see CAreadme.txt
// 
// 0 BFC CERTIFY CCW
  [0,"BFC","CERTIFY"],
  [0,"BFC","CCW"],
// 
// 0 !HISTORY 2014-06-21 [PTadmin] Official Update 2014-01
// 
// 
// 4 16 0.9239 0 0.3827 -0.9239 0 0.3827 -1 0 0 1 0 0
  [4,16,0.9239,0,0.3827,-0.9239,0,0.3827,-1,0,0,1,0,0],
// 4 16 0.7071 0 0.7071 -0.7071 0 0.7071 -0.9239 0 0.3827 0.9239 0 0.3827
  [4,16,0.7071,0,0.7071,-0.7071,0,0.7071,-0.9239,0,0.3827,0.9239,0,0.3827],
// 4 16 0.3827 0 0.9239 -0.3827 0 0.9239 -0.7071 0 0.7071 0.7071 0 0.7071
  [4,16,0.3827,0,0.9239,-0.3827,0,0.9239,-0.7071,0,0.7071,0.7071,0,0.7071],
// 3 16 0 0 1 -0.3827 0 0.9239 0.3827 0 0.9239
  [3,16,0,0,1,-0.3827,0,0.9239,0.3827,0,0.9239],
];
module ldraw_lib__2_4chrd(step=0, col=false, unit=2/5, alt=false, line=0.2, solid=!$preview)
    makepoly(ldraw_lib__2_4chrd(solid), step=step, col=col, unit=unit, alt=alt, line=line, solid=solid);
ldraw_lib__2_4chrd(line=0.2);
// file: ../p/1-4ndis.scad
use <../lib.scad>
function ldraw_lib__1_4ndis() = [
// 0 Disc Negative 0.25
// 0 Name: 1-4ndis.dat
// 0 Author: James Jessiman
// 0 !LDRAW_ORG Primitive UPDATE 2012-01
// 0 !LICENSE Licensed under CC BY 2.0 and CC BY 4.0 : see CAreadme.txt
// 
// 0 BFC CERTIFY CCW
  [0,"BFC","CERTIFY"],
  [0,"BFC","CCW"],
// 
// 0 !HISTORY 2002-03-23 [sbliss] Added BFC Statement
// 0 !HISTORY 2002-04-25 [PTadmin] Official Update 2002-02
// 0 !HISTORY 2007-06-22 [PTadmin] Header formatted for Contributor Agreement
// 0 !HISTORY 2008-07-01 [PTadmin] Official Update 2008-01
// 0 !HISTORY 2012-02-16 [Philo] Changed to CCW
// 0 !HISTORY 2012-03-30 [PTadmin] Official Update 2012-01
// 
// 
// 3 16 0.9239 0 0.3827 1 0 0 1 0 1
  [3,16,0.9239,0,0.3827,1,0,0,1,0,1],
// 3 16 0.7071 0 0.7071 0.9239 0 0.3827 1 0 1
  [3,16,0.7071,0,0.7071,0.9239,0,0.3827,1,0,1],
// 3 16 0.3827 0 0.9239 0.7071 0 0.7071 1 0 1
  [3,16,0.3827,0,0.9239,0.7071,0,0.7071,1,0,1],
// 3 16 0 0 1 0.3827 0 0.9239 1 0 1
  [3,16,0,0,1,0.3827,0,0.9239,1,0,1],
];
module ldraw_lib__1_4ndis(step=0, col=false, unit=2/5, alt=false, line=0.2, solid=!$preview)
    makepoly(ldraw_lib__1_4ndis(), step=step, col=col, unit=unit, alt=alt, line=line, solid=solid);
ldraw_lib__1_4ndis(line=0.2);
// file: ../p/1-4chrd.scad
use <../lib.scad>
$fa=1; $fs=0.2;
function ldraw_lib__1_4chrd(realsolid=false) = [
// 0 Chord 0.25
// 0 Name: 1-4chrd.dat
// 0 Author: Tony Hafner [hafhead]
// 0 !LDRAW_ORG Primitive UPDATE 2012-02
// 0 !LICENSE Licensed under CC BY 2.0 and CC BY 4.0 : see CAreadme.txt
// 
// 0 BFC CERTIFY CCW
  [0,"BFC","CERTIFY"],
  [0,"BFC","CCW"],
// 
// 0 !HISTORY 2004-04-22 [PTadmin] Official Update 2004-02
// 0 !HISTORY 2007-10-09 [PTadmin] Header formatted for Contributor Agreement
// 0 !HISTORY 2008-07-01 [PTadmin] Official Update 2008-01
// 0 !HISTORY 2012-08-02 [MMR1988] Re-creation with PrimGen2 and Rectifier
// 0 !HISTORY 2012-08-09 [PTadmin] Official Update 2012-02
// 
// 
// 4 16 0.9239 0 0.3827 0.3827 0 0.9239 0 0 1 1 0 0
  [4,16,0.9239,0,0.3827,0.3827,0,0.9239,0,0,1,1,0,0],
// 3 16 0.7071 0 0.7071 0.3827 0 0.9239 0.9239 0 0.3827
  [3,16,0.7071,0,0.7071,0.3827,0,0.9239,0.9239,0,0.3827],
];
module ldraw_lib__1_4chrd(step=0, col=false, unit=2/5, alt=false, line=0.2, solid=!$preview)
    makepoly(ldraw_lib__1_4chrd(solid), step=step, col=col, unit=unit, alt=alt, line=line, solid=solid);
ldraw_lib__1_4chrd(line=0.2);
// main file
use <../lib.scad>
use <../p/1-4chrd.scad>
use <../p/1-4ndis.scad>
use <../p/2-4chrd.scad>
use <../p/2-4ndis.scad>
use <../p/3-16chrd.scad>
use <../p/3-16ndis.scad>
use <s/6636s01.scad>
function ldraw_lib__6636p0h() = [
// 0 Tile  1 x  6 with Red "B" and "A" Pattern
// 0 Name: 6636p0h.dat
// 0 Author: Florent Faramond [Makou]
// 0 !LDRAW_ORG Part UPDATE 2024-07
// 0 !LICENSE Licensed under CC BY 4.0 : see CAreadme.txt
// 
// 0 BFC CERTIFY CCW
  [0,"BFC","CERTIFY"],
  [0,"BFC","CCW"],
// 
// 0 !KEYWORDS Bricklink 6636pb228, Brickowl 106878, Rebrickable 6636pr0026
// 0 !KEYWORDS Set 71374
// 
// 0 !HISTORY 2024-08-26 [OrionP] Official Update 2024-07
// 
// 1 16 0 0 0 1 0 0 0 1 0 0 0 1 s\6636s01.dat
  [1,16,0,0,0,1,0,0,0,1,0,0,0,1, ldraw_lib__s__6636s01()],
// 
// 1 4 30 0 3 0 0 -1 0 1 0 1 0 0 1-4chrd.dat
  [1,4,30,0,3,0,0,-1,0,1,0,1,0,0, ldraw_lib__1_4chrd()],
// 1 4 37 0 3 1 0 0 0 1 0 0 0 1 1-4chrd.dat
  [1,4,37,0,3,1,0,0,0,1,0,0,0,1, ldraw_lib__1_4chrd()],
// 1 4 31.5 0 1.5 0 0 -.5 0 1 0 .5 0 0 1-4ndis.dat
  [1,4,31.5,0,1.5,0,0,-.5,0,1,0,.5,0,0, ldraw_lib__1_4ndis()],
// 1 4 35.5 0 1.5 .5 0 0 0 1 0 0 0 .5 1-4ndis.dat
  [1,4,35.5,0,1.5,.5,0,0,0,1,0,0,0,.5, ldraw_lib__1_4ndis()],
// 1 4 35.5 0 1 0 0 .5 0 1 0 -.5 0 0 1-4ndis.dat
  [1,4,35.5,0,1,0,0,.5,0,1,0,-.5,0,0, ldraw_lib__1_4ndis()],
// 1 4 31.5 0 1 -.5 0 0 0 1 0 0 0 -.5 1-4ndis.dat
  [1,4,31.5,0,1,-.5,0,0,0,1,0,0,0,-.5, ldraw_lib__1_4ndis()],
// 1 4 -15 0 3 1 0 0 0 1 0 0 0 1 1-4chrd.dat
  [1,4,-15,0,3,1,0,0,0,1,0,0,0,1, ldraw_lib__1_4chrd()],
// 1 4 -15 0 1 1 0 0 0 1 0 0 0 -1 3-16chrd.dat
  [1,4,-15,0,1,1,0,0,0,1,0,0,0,-1, ldraw_lib__3_16chrd()],
// 1 4 -15 0 -1 1 0 0 0 1 0 0 0 1 3-16chrd.dat
  [1,4,-15,0,-1,1,0,0,0,1,0,0,0,1, ldraw_lib__3_16chrd()],
// 1 4 -15 0 -3 0 0 1 0 1 0 -1 0 0 1-4chrd.dat
  [1,4,-15,0,-3,0,0,1,0,1,0,-1,0,0, ldraw_lib__1_4chrd()],
// 1 4 -16.5 0 1.4 0 0 .5 0 1 0 -.65 0 0 2-4ndis.dat
  [1,4,-16.5,0,1.4,0,0,.5,0,1,0,-.65,0,0, ldraw_lib__2_4ndis()],
// 1 4 -16.5 0 -1.4 0 0 .5 0 1 0 -.65 0 0 2-4ndis.dat
  [1,4,-16.5,0,-1.4,0,0,.5,0,1,0,-.65,0,0, ldraw_lib__2_4ndis()],
// 1 16 31.5 0 1.5 0 0 -.5 0 1 0 .5 0 0 1-4chrd.dat
  [1,16,31.5,0,1.5,0,0,-.5,0,1,0,.5,0,0, ldraw_lib__1_4chrd()],
// 1 16 31.5 0 1 -.5 0 0 0 1 0 0 0 -.5 1-4chrd.dat
  [1,16,31.5,0,1,-.5,0,0,0,1,0,0,0,-.5, ldraw_lib__1_4chrd()],
// 1 16 35.5 0 1 0 0 .5 0 1 0 -.5 0 0 1-4chrd.dat
  [1,16,35.5,0,1,0,0,.5,0,1,0,-.5,0,0, ldraw_lib__1_4chrd()],
// 1 16 35.5 0 1.5 .5 0 0 0 1 0 0 0 .5 1-4chrd.dat
  [1,16,35.5,0,1.5,.5,0,0,0,1,0,0,0,.5, ldraw_lib__1_4chrd()],
// 1 16 37 0 3 1 0 0 0 1 0 0 0 1 1-4ndis.dat
  [1,16,37,0,3,1,0,0,0,1,0,0,0,1, ldraw_lib__1_4ndis()],
// 1 16 30 0 3 0 0 -1 0 1 0 1 0 0 1-4ndis.dat
  [1,16,30,0,3,0,0,-1,0,1,0,1,0,0, ldraw_lib__1_4ndis()],
// 1 16 -16.5 0 1.4 0 0 .5 0 1 0 -.65 0 0 2-4chrd.dat
  [1,16,-16.5,0,1.4,0,0,.5,0,1,0,-.65,0,0, ldraw_lib__2_4chrd()],
// 1 16 -16.5 0 -1.4 0 0 .5 0 1 0 -.65 0 0 2-4chrd.dat
  [1,16,-16.5,0,-1.4,0,0,.5,0,1,0,-.65,0,0, ldraw_lib__2_4chrd()],
// 1 16 -15 0 -3 0 0 1 0 1 0 -1 0 0 1-4ndis.dat
  [1,16,-15,0,-3,0,0,1,0,1,0,-1,0,0, ldraw_lib__1_4ndis()],
// 1 16 -15 0 3 1 0 0 0 1 0 0 0 1 1-4ndis.dat
  [1,16,-15,0,3,1,0,0,0,1,0,0,0,1, ldraw_lib__1_4ndis()],
// 1 16 -15 0 -1 1 0 0 0 1 0 0 0 1 3-16ndis.dat
  [1,16,-15,0,-1,1,0,0,0,1,0,0,0,1, ldraw_lib__3_16ndis()],
// 1 16 -15 0 1 1 0 0 0 1 0 0 0 -1 3-16ndis.dat
  [1,16,-15,0,1,1,0,0,0,1,0,0,0,-1, ldraw_lib__3_16ndis()],
// 3 4 29 0 3 31 0 2 31.5 0 2
  [3,4,29,0,3,31,0,2,31.5,0,2],
// 3 4 38 0 3 35.5 0 2 36 0 2
  [3,4,38,0,3,35.5,0,2,36,0,2],
// 3 4 29 0 3 31 0 1.5 31 0 2
  [3,4,29,0,3,31,0,1.5,31,0,2],
// 3 4 29 0 3 31 0 1 31 0 1.5
  [3,4,29,0,3,31,0,1,31,0,1.5],
// 3 4 29 0 3 31 0 .5 31 0 1
  [3,4,29,0,3,31,0,.5,31,0,1],
// 3 4 31 0 -1 29 0 -4 31 0 -4
  [3,4,31,0,-1,29,0,-4,31,0,-4],
// 3 4 38 0 3 36 0 2 36 0 1.5
  [3,4,38,0,3,36,0,2,36,0,1.5],
// 3 4 38 0 3 36 0 1.5 36 0 1
  [3,4,38,0,3,36,0,1.5,36,0,1],
// 3 4 38 0 3 36 0 1 36 0 .5
  [3,4,38,0,3,36,0,1,36,0,.5],
// 3 4 36 0 -1 36 0 -4 38 0 -4
  [3,4,36,0,-1,36,0,-4,38,0,-4],
// 3 4 35.5 0 .5 31.5 0 .5 36 0 -1
  [3,4,35.5,0,.5,31.5,0,.5,36,0,-1],
// 3 4 35.5 0 .5 36 0 -1 36 0 .5
  [3,4,35.5,0,.5,36,0,-1,36,0,.5],
// 3 4 -23 0 4 -21 0 2.05 -16.5 0 2.05
  [3,4,-23,0,4,-21,0,2.05,-16.5,0,2.05],
// 3 4 -23 0 4 -21 0 .75 -21 0 2.05
  [3,4,-23,0,4,-21,0,.75,-21,0,2.05],
// 3 4 -23 0 4 -21 0 -.75 -21 0 .75
  [3,4,-23,0,4,-21,0,-.75,-21,0,.75],
// 3 4 -15 0 4 -16 0 2.05 -14 0 3
  [3,4,-15,0,4,-16,0,2.05,-14,0,3],
// 3 16 -14.6173 0 .0761 -14.6173 0 -.0761 -14 0 0
  [3,16,-14.6173,0,.0761,-14.6173,0,-.0761,-14,0,0],
// 3 16 60 0 10 38 0 4 38 0 3
  [3,16,60,0,10,38,0,4,38,0,3],
// 3 16 29 0 3 -14 0 3 -14 0 1
  [3,16,29,0,3,-14,0,3,-14,0,1],
// 3 16 29 0 3 -14 0 1 -14 0 0
  [3,16,29,0,3,-14,0,1,-14,0,0],
// 3 16 -14 0 -1 -14 0 -3 29 0 -4
  [3,16,-14,0,-1,-14,0,-3,29,0,-4],
// 3 16 -60 0 10 -23 0 4 -15 0 4
  [3,16,-60,0,10,-23,0,4,-15,0,4],
// 3 16 -60 0 10 -15 0 4 -14 0 4
  [3,16,-60,0,10,-15,0,4,-14,0,4],
// 3 16 60 0 10 29 0 4 30 0 4
  [3,16,60,0,10,29,0,4,30,0,4],
// 3 16 60 0 10 30 0 4 37 0 4
  [3,16,60,0,10,30,0,4,37,0,4],
// 3 16 60 0 10 37 0 4 38 0 4
  [3,16,60,0,10,37,0,4,38,0,4],
// 3 16 38 0 -4 36 0 -4 60 0 -10
  [3,16,38,0,-4,36,0,-4,60,0,-10],
// 3 16 36 0 -4 31 0 -4 60 0 -10
  [3,16,36,0,-4,31,0,-4,60,0,-10],
// 3 16 31 0 -4 29 0 -4 60 0 -10
  [3,16,31,0,-4,29,0,-4,60,0,-10],
// 3 16 -15 0 -4 -23 0 -4 -60 0 -10
  [3,16,-15,0,-4,-23,0,-4,-60,0,-10],
// 4 4 37 0 4 30 0 4 29 0 3 38 0 3
  [4,4,37,0,4,30,0,4,29,0,3,38,0,3],
// 4 4 29 0 3 31.5 0 2 35.5 0 2 38 0 3
  [4,4,29,0,3,31.5,0,2,35.5,0,2,38,0,3],
// 4 4 31 0 -1 31 0 .5 29 0 3 29 0 -4
  [4,4,31,0,-1,31,0,.5,29,0,3,29,0,-4],
// 4 4 38 0 3 36 0 .5 36 0 -1 38 0 -4
  [4,4,38,0,3,36,0,.5,36,0,-1,38,0,-4],
// 4 4 31.5 0 .5 31 0 .5 31 0 -1 36 0 -1
  [4,4,31.5,0,.5,31,0,.5,31,0,-1,36,0,-1],
// 4 4 -16.5 0 2.05 -16 0 2.05 -15 0 4 -23 0 4
  [4,4,-16.5,0,2.05,-16,0,2.05,-15,0,4,-23,0,4],
// 4 4 -21 0 -2.05 -21 0 -.75 -23 0 4 -23 0 -4
  [4,4,-21,0,-2.05,-21,0,-.75,-23,0,4,-23,0,-4],
// 4 4 -21 0 -2.05 -23 0 -4 -15 0 -4 -16.5 0 -2.05
  [4,4,-21,0,-2.05,-23,0,-4,-15,0,-4,-16.5,0,-2.05],
// 4 4 -16.5 0 -2.05 -15 0 -4 -14 0 -3 -16 0 -2.05
  [4,4,-16.5,0,-2.05,-15,0,-4,-14,0,-3,-16,0,-2.05],
// 4 4 -16 0 -2.05 -14 0 -3 -14 0 -1 -16 0 -1.4
  [4,4,-16,0,-2.05,-14,0,-3,-14,0,-1,-16,0,-1.4],
// 4 4 -16 0 -.75 -16 0 -1.4 -14 0 -1 -14.6173 0 -.0761
  [4,4,-16,0,-.75,-16,0,-1.4,-14,0,-1,-14.6173,0,-.0761],
// 4 4 -16 0 .75 -16 0 -.75 -14.6173 0 -.0761 -14.6173 0 .0761
  [4,4,-16,0,.75,-16,0,-.75,-14.6173,0,-.0761,-14.6173,0,.0761],
// 4 4 -16 0 .75 -14.6173 0 .0761 -14 0 1 -16 0 1.4
  [4,4,-16,0,.75,-14.6173,0,.0761,-14,0,1,-16,0,1.4],
// 4 4 -16 0 1.4 -14 0 1 -14 0 3 -16 0 2.05
  [4,4,-16,0,1.4,-14,0,1,-14,0,3,-16,0,2.05],
// 4 4 -16.5 0 -.75 -16.5 0 .75 -21 0 .75 -21 0 -.75
  [4,4,-16.5,0,-.75,-16.5,0,.75,-21,0,.75,-21,0,-.75],
// 4 4 -16.5 0 .75 -16.5 0 -.75 -16 0 -.75 -16 0 .75
  [4,4,-16.5,0,.75,-16.5,0,-.75,-16,0,-.75,-16,0,.75],
// 4 16 31.5 0 .5 31.5 0 2 31 0 1.5 31 0 1
  [4,16,31.5,0,.5,31.5,0,2,31,0,1.5,31,0,1],
// 4 16 36 0 1 36 0 1.5 35.5 0 2 35.5 0 .5
  [4,16,36,0,1,36,0,1.5,35.5,0,2,35.5,0,.5],
// 4 16 31.5 0 .5 35.5 0 .5 35.5 0 2 31.5 0 2
  [4,16,31.5,0,.5,35.5,0,.5,35.5,0,2,31.5,0,2],
// 4 16 36 0 -1 31 0 -1 31 0 -4 36 0 -4
  [4,16,36,0,-1,31,0,-1,31,0,-4,36,0,-4],
// 4 16 -16.5 0 .75 -16.5 0 2.05 -21 0 2.05 -21 0 .75
  [4,16,-16.5,0,.75,-16.5,0,2.05,-21,0,2.05,-21,0,.75],
// 4 16 -16.5 0 -2.05 -16.5 0 -.75 -21 0 -.75 -21 0 -2.05
  [4,16,-16.5,0,-2.05,-16.5,0,-.75,-21,0,-.75,-21,0,-2.05],
// 4 16 38 0 3 38 0 -4 60 0 -10 60 0 10
  [4,16,38,0,3,38,0,-4,60,0,-10,60,0,10],
// 4 16 29 0 3 29 0 4 -14 0 4 -14 0 3
  [4,16,29,0,3,29,0,4,-14,0,4,-14,0,3],
// 4 16 29 0 3 -14 0 0 -14 0 -1 29 0 -4
  [4,16,29,0,3,-14,0,0,-14,0,-1,29,0,-4],
// 4 16 29 0 -4 -14 0 -3 -14 0 -4 60 0 -10
  [4,16,29,0,-4,-14,0,-3,-14,0,-4,60,0,-10],
// 4 16 -23 0 -4 -23 0 4 -60 0 10 -60 0 -10
  [4,16,-23,0,-4,-23,0,4,-60,0,10,-60,0,-10],
// 4 16 -60 0 10 -14 0 4 29 0 4 60 0 10
  [4,16,-60,0,10,-14,0,4,29,0,4,60,0,10],
// 4 16 -60 0 -10 60 0 -10 -14 0 -4 -15 0 -4
  [4,16,-60,0,-10,60,0,-10,-14,0,-4,-15,0,-4],
];
module ldraw_lib__6636p0h(step=0, col=false, unit=2/5, alt=false, line=0.2, solid=!$preview)
    makepoly(ldraw_lib__6636p0h(), step=step, col=col, unit=unit, alt=alt, line=line, solid=solid);
ldraw_lib__6636p0h(line=0.2);
